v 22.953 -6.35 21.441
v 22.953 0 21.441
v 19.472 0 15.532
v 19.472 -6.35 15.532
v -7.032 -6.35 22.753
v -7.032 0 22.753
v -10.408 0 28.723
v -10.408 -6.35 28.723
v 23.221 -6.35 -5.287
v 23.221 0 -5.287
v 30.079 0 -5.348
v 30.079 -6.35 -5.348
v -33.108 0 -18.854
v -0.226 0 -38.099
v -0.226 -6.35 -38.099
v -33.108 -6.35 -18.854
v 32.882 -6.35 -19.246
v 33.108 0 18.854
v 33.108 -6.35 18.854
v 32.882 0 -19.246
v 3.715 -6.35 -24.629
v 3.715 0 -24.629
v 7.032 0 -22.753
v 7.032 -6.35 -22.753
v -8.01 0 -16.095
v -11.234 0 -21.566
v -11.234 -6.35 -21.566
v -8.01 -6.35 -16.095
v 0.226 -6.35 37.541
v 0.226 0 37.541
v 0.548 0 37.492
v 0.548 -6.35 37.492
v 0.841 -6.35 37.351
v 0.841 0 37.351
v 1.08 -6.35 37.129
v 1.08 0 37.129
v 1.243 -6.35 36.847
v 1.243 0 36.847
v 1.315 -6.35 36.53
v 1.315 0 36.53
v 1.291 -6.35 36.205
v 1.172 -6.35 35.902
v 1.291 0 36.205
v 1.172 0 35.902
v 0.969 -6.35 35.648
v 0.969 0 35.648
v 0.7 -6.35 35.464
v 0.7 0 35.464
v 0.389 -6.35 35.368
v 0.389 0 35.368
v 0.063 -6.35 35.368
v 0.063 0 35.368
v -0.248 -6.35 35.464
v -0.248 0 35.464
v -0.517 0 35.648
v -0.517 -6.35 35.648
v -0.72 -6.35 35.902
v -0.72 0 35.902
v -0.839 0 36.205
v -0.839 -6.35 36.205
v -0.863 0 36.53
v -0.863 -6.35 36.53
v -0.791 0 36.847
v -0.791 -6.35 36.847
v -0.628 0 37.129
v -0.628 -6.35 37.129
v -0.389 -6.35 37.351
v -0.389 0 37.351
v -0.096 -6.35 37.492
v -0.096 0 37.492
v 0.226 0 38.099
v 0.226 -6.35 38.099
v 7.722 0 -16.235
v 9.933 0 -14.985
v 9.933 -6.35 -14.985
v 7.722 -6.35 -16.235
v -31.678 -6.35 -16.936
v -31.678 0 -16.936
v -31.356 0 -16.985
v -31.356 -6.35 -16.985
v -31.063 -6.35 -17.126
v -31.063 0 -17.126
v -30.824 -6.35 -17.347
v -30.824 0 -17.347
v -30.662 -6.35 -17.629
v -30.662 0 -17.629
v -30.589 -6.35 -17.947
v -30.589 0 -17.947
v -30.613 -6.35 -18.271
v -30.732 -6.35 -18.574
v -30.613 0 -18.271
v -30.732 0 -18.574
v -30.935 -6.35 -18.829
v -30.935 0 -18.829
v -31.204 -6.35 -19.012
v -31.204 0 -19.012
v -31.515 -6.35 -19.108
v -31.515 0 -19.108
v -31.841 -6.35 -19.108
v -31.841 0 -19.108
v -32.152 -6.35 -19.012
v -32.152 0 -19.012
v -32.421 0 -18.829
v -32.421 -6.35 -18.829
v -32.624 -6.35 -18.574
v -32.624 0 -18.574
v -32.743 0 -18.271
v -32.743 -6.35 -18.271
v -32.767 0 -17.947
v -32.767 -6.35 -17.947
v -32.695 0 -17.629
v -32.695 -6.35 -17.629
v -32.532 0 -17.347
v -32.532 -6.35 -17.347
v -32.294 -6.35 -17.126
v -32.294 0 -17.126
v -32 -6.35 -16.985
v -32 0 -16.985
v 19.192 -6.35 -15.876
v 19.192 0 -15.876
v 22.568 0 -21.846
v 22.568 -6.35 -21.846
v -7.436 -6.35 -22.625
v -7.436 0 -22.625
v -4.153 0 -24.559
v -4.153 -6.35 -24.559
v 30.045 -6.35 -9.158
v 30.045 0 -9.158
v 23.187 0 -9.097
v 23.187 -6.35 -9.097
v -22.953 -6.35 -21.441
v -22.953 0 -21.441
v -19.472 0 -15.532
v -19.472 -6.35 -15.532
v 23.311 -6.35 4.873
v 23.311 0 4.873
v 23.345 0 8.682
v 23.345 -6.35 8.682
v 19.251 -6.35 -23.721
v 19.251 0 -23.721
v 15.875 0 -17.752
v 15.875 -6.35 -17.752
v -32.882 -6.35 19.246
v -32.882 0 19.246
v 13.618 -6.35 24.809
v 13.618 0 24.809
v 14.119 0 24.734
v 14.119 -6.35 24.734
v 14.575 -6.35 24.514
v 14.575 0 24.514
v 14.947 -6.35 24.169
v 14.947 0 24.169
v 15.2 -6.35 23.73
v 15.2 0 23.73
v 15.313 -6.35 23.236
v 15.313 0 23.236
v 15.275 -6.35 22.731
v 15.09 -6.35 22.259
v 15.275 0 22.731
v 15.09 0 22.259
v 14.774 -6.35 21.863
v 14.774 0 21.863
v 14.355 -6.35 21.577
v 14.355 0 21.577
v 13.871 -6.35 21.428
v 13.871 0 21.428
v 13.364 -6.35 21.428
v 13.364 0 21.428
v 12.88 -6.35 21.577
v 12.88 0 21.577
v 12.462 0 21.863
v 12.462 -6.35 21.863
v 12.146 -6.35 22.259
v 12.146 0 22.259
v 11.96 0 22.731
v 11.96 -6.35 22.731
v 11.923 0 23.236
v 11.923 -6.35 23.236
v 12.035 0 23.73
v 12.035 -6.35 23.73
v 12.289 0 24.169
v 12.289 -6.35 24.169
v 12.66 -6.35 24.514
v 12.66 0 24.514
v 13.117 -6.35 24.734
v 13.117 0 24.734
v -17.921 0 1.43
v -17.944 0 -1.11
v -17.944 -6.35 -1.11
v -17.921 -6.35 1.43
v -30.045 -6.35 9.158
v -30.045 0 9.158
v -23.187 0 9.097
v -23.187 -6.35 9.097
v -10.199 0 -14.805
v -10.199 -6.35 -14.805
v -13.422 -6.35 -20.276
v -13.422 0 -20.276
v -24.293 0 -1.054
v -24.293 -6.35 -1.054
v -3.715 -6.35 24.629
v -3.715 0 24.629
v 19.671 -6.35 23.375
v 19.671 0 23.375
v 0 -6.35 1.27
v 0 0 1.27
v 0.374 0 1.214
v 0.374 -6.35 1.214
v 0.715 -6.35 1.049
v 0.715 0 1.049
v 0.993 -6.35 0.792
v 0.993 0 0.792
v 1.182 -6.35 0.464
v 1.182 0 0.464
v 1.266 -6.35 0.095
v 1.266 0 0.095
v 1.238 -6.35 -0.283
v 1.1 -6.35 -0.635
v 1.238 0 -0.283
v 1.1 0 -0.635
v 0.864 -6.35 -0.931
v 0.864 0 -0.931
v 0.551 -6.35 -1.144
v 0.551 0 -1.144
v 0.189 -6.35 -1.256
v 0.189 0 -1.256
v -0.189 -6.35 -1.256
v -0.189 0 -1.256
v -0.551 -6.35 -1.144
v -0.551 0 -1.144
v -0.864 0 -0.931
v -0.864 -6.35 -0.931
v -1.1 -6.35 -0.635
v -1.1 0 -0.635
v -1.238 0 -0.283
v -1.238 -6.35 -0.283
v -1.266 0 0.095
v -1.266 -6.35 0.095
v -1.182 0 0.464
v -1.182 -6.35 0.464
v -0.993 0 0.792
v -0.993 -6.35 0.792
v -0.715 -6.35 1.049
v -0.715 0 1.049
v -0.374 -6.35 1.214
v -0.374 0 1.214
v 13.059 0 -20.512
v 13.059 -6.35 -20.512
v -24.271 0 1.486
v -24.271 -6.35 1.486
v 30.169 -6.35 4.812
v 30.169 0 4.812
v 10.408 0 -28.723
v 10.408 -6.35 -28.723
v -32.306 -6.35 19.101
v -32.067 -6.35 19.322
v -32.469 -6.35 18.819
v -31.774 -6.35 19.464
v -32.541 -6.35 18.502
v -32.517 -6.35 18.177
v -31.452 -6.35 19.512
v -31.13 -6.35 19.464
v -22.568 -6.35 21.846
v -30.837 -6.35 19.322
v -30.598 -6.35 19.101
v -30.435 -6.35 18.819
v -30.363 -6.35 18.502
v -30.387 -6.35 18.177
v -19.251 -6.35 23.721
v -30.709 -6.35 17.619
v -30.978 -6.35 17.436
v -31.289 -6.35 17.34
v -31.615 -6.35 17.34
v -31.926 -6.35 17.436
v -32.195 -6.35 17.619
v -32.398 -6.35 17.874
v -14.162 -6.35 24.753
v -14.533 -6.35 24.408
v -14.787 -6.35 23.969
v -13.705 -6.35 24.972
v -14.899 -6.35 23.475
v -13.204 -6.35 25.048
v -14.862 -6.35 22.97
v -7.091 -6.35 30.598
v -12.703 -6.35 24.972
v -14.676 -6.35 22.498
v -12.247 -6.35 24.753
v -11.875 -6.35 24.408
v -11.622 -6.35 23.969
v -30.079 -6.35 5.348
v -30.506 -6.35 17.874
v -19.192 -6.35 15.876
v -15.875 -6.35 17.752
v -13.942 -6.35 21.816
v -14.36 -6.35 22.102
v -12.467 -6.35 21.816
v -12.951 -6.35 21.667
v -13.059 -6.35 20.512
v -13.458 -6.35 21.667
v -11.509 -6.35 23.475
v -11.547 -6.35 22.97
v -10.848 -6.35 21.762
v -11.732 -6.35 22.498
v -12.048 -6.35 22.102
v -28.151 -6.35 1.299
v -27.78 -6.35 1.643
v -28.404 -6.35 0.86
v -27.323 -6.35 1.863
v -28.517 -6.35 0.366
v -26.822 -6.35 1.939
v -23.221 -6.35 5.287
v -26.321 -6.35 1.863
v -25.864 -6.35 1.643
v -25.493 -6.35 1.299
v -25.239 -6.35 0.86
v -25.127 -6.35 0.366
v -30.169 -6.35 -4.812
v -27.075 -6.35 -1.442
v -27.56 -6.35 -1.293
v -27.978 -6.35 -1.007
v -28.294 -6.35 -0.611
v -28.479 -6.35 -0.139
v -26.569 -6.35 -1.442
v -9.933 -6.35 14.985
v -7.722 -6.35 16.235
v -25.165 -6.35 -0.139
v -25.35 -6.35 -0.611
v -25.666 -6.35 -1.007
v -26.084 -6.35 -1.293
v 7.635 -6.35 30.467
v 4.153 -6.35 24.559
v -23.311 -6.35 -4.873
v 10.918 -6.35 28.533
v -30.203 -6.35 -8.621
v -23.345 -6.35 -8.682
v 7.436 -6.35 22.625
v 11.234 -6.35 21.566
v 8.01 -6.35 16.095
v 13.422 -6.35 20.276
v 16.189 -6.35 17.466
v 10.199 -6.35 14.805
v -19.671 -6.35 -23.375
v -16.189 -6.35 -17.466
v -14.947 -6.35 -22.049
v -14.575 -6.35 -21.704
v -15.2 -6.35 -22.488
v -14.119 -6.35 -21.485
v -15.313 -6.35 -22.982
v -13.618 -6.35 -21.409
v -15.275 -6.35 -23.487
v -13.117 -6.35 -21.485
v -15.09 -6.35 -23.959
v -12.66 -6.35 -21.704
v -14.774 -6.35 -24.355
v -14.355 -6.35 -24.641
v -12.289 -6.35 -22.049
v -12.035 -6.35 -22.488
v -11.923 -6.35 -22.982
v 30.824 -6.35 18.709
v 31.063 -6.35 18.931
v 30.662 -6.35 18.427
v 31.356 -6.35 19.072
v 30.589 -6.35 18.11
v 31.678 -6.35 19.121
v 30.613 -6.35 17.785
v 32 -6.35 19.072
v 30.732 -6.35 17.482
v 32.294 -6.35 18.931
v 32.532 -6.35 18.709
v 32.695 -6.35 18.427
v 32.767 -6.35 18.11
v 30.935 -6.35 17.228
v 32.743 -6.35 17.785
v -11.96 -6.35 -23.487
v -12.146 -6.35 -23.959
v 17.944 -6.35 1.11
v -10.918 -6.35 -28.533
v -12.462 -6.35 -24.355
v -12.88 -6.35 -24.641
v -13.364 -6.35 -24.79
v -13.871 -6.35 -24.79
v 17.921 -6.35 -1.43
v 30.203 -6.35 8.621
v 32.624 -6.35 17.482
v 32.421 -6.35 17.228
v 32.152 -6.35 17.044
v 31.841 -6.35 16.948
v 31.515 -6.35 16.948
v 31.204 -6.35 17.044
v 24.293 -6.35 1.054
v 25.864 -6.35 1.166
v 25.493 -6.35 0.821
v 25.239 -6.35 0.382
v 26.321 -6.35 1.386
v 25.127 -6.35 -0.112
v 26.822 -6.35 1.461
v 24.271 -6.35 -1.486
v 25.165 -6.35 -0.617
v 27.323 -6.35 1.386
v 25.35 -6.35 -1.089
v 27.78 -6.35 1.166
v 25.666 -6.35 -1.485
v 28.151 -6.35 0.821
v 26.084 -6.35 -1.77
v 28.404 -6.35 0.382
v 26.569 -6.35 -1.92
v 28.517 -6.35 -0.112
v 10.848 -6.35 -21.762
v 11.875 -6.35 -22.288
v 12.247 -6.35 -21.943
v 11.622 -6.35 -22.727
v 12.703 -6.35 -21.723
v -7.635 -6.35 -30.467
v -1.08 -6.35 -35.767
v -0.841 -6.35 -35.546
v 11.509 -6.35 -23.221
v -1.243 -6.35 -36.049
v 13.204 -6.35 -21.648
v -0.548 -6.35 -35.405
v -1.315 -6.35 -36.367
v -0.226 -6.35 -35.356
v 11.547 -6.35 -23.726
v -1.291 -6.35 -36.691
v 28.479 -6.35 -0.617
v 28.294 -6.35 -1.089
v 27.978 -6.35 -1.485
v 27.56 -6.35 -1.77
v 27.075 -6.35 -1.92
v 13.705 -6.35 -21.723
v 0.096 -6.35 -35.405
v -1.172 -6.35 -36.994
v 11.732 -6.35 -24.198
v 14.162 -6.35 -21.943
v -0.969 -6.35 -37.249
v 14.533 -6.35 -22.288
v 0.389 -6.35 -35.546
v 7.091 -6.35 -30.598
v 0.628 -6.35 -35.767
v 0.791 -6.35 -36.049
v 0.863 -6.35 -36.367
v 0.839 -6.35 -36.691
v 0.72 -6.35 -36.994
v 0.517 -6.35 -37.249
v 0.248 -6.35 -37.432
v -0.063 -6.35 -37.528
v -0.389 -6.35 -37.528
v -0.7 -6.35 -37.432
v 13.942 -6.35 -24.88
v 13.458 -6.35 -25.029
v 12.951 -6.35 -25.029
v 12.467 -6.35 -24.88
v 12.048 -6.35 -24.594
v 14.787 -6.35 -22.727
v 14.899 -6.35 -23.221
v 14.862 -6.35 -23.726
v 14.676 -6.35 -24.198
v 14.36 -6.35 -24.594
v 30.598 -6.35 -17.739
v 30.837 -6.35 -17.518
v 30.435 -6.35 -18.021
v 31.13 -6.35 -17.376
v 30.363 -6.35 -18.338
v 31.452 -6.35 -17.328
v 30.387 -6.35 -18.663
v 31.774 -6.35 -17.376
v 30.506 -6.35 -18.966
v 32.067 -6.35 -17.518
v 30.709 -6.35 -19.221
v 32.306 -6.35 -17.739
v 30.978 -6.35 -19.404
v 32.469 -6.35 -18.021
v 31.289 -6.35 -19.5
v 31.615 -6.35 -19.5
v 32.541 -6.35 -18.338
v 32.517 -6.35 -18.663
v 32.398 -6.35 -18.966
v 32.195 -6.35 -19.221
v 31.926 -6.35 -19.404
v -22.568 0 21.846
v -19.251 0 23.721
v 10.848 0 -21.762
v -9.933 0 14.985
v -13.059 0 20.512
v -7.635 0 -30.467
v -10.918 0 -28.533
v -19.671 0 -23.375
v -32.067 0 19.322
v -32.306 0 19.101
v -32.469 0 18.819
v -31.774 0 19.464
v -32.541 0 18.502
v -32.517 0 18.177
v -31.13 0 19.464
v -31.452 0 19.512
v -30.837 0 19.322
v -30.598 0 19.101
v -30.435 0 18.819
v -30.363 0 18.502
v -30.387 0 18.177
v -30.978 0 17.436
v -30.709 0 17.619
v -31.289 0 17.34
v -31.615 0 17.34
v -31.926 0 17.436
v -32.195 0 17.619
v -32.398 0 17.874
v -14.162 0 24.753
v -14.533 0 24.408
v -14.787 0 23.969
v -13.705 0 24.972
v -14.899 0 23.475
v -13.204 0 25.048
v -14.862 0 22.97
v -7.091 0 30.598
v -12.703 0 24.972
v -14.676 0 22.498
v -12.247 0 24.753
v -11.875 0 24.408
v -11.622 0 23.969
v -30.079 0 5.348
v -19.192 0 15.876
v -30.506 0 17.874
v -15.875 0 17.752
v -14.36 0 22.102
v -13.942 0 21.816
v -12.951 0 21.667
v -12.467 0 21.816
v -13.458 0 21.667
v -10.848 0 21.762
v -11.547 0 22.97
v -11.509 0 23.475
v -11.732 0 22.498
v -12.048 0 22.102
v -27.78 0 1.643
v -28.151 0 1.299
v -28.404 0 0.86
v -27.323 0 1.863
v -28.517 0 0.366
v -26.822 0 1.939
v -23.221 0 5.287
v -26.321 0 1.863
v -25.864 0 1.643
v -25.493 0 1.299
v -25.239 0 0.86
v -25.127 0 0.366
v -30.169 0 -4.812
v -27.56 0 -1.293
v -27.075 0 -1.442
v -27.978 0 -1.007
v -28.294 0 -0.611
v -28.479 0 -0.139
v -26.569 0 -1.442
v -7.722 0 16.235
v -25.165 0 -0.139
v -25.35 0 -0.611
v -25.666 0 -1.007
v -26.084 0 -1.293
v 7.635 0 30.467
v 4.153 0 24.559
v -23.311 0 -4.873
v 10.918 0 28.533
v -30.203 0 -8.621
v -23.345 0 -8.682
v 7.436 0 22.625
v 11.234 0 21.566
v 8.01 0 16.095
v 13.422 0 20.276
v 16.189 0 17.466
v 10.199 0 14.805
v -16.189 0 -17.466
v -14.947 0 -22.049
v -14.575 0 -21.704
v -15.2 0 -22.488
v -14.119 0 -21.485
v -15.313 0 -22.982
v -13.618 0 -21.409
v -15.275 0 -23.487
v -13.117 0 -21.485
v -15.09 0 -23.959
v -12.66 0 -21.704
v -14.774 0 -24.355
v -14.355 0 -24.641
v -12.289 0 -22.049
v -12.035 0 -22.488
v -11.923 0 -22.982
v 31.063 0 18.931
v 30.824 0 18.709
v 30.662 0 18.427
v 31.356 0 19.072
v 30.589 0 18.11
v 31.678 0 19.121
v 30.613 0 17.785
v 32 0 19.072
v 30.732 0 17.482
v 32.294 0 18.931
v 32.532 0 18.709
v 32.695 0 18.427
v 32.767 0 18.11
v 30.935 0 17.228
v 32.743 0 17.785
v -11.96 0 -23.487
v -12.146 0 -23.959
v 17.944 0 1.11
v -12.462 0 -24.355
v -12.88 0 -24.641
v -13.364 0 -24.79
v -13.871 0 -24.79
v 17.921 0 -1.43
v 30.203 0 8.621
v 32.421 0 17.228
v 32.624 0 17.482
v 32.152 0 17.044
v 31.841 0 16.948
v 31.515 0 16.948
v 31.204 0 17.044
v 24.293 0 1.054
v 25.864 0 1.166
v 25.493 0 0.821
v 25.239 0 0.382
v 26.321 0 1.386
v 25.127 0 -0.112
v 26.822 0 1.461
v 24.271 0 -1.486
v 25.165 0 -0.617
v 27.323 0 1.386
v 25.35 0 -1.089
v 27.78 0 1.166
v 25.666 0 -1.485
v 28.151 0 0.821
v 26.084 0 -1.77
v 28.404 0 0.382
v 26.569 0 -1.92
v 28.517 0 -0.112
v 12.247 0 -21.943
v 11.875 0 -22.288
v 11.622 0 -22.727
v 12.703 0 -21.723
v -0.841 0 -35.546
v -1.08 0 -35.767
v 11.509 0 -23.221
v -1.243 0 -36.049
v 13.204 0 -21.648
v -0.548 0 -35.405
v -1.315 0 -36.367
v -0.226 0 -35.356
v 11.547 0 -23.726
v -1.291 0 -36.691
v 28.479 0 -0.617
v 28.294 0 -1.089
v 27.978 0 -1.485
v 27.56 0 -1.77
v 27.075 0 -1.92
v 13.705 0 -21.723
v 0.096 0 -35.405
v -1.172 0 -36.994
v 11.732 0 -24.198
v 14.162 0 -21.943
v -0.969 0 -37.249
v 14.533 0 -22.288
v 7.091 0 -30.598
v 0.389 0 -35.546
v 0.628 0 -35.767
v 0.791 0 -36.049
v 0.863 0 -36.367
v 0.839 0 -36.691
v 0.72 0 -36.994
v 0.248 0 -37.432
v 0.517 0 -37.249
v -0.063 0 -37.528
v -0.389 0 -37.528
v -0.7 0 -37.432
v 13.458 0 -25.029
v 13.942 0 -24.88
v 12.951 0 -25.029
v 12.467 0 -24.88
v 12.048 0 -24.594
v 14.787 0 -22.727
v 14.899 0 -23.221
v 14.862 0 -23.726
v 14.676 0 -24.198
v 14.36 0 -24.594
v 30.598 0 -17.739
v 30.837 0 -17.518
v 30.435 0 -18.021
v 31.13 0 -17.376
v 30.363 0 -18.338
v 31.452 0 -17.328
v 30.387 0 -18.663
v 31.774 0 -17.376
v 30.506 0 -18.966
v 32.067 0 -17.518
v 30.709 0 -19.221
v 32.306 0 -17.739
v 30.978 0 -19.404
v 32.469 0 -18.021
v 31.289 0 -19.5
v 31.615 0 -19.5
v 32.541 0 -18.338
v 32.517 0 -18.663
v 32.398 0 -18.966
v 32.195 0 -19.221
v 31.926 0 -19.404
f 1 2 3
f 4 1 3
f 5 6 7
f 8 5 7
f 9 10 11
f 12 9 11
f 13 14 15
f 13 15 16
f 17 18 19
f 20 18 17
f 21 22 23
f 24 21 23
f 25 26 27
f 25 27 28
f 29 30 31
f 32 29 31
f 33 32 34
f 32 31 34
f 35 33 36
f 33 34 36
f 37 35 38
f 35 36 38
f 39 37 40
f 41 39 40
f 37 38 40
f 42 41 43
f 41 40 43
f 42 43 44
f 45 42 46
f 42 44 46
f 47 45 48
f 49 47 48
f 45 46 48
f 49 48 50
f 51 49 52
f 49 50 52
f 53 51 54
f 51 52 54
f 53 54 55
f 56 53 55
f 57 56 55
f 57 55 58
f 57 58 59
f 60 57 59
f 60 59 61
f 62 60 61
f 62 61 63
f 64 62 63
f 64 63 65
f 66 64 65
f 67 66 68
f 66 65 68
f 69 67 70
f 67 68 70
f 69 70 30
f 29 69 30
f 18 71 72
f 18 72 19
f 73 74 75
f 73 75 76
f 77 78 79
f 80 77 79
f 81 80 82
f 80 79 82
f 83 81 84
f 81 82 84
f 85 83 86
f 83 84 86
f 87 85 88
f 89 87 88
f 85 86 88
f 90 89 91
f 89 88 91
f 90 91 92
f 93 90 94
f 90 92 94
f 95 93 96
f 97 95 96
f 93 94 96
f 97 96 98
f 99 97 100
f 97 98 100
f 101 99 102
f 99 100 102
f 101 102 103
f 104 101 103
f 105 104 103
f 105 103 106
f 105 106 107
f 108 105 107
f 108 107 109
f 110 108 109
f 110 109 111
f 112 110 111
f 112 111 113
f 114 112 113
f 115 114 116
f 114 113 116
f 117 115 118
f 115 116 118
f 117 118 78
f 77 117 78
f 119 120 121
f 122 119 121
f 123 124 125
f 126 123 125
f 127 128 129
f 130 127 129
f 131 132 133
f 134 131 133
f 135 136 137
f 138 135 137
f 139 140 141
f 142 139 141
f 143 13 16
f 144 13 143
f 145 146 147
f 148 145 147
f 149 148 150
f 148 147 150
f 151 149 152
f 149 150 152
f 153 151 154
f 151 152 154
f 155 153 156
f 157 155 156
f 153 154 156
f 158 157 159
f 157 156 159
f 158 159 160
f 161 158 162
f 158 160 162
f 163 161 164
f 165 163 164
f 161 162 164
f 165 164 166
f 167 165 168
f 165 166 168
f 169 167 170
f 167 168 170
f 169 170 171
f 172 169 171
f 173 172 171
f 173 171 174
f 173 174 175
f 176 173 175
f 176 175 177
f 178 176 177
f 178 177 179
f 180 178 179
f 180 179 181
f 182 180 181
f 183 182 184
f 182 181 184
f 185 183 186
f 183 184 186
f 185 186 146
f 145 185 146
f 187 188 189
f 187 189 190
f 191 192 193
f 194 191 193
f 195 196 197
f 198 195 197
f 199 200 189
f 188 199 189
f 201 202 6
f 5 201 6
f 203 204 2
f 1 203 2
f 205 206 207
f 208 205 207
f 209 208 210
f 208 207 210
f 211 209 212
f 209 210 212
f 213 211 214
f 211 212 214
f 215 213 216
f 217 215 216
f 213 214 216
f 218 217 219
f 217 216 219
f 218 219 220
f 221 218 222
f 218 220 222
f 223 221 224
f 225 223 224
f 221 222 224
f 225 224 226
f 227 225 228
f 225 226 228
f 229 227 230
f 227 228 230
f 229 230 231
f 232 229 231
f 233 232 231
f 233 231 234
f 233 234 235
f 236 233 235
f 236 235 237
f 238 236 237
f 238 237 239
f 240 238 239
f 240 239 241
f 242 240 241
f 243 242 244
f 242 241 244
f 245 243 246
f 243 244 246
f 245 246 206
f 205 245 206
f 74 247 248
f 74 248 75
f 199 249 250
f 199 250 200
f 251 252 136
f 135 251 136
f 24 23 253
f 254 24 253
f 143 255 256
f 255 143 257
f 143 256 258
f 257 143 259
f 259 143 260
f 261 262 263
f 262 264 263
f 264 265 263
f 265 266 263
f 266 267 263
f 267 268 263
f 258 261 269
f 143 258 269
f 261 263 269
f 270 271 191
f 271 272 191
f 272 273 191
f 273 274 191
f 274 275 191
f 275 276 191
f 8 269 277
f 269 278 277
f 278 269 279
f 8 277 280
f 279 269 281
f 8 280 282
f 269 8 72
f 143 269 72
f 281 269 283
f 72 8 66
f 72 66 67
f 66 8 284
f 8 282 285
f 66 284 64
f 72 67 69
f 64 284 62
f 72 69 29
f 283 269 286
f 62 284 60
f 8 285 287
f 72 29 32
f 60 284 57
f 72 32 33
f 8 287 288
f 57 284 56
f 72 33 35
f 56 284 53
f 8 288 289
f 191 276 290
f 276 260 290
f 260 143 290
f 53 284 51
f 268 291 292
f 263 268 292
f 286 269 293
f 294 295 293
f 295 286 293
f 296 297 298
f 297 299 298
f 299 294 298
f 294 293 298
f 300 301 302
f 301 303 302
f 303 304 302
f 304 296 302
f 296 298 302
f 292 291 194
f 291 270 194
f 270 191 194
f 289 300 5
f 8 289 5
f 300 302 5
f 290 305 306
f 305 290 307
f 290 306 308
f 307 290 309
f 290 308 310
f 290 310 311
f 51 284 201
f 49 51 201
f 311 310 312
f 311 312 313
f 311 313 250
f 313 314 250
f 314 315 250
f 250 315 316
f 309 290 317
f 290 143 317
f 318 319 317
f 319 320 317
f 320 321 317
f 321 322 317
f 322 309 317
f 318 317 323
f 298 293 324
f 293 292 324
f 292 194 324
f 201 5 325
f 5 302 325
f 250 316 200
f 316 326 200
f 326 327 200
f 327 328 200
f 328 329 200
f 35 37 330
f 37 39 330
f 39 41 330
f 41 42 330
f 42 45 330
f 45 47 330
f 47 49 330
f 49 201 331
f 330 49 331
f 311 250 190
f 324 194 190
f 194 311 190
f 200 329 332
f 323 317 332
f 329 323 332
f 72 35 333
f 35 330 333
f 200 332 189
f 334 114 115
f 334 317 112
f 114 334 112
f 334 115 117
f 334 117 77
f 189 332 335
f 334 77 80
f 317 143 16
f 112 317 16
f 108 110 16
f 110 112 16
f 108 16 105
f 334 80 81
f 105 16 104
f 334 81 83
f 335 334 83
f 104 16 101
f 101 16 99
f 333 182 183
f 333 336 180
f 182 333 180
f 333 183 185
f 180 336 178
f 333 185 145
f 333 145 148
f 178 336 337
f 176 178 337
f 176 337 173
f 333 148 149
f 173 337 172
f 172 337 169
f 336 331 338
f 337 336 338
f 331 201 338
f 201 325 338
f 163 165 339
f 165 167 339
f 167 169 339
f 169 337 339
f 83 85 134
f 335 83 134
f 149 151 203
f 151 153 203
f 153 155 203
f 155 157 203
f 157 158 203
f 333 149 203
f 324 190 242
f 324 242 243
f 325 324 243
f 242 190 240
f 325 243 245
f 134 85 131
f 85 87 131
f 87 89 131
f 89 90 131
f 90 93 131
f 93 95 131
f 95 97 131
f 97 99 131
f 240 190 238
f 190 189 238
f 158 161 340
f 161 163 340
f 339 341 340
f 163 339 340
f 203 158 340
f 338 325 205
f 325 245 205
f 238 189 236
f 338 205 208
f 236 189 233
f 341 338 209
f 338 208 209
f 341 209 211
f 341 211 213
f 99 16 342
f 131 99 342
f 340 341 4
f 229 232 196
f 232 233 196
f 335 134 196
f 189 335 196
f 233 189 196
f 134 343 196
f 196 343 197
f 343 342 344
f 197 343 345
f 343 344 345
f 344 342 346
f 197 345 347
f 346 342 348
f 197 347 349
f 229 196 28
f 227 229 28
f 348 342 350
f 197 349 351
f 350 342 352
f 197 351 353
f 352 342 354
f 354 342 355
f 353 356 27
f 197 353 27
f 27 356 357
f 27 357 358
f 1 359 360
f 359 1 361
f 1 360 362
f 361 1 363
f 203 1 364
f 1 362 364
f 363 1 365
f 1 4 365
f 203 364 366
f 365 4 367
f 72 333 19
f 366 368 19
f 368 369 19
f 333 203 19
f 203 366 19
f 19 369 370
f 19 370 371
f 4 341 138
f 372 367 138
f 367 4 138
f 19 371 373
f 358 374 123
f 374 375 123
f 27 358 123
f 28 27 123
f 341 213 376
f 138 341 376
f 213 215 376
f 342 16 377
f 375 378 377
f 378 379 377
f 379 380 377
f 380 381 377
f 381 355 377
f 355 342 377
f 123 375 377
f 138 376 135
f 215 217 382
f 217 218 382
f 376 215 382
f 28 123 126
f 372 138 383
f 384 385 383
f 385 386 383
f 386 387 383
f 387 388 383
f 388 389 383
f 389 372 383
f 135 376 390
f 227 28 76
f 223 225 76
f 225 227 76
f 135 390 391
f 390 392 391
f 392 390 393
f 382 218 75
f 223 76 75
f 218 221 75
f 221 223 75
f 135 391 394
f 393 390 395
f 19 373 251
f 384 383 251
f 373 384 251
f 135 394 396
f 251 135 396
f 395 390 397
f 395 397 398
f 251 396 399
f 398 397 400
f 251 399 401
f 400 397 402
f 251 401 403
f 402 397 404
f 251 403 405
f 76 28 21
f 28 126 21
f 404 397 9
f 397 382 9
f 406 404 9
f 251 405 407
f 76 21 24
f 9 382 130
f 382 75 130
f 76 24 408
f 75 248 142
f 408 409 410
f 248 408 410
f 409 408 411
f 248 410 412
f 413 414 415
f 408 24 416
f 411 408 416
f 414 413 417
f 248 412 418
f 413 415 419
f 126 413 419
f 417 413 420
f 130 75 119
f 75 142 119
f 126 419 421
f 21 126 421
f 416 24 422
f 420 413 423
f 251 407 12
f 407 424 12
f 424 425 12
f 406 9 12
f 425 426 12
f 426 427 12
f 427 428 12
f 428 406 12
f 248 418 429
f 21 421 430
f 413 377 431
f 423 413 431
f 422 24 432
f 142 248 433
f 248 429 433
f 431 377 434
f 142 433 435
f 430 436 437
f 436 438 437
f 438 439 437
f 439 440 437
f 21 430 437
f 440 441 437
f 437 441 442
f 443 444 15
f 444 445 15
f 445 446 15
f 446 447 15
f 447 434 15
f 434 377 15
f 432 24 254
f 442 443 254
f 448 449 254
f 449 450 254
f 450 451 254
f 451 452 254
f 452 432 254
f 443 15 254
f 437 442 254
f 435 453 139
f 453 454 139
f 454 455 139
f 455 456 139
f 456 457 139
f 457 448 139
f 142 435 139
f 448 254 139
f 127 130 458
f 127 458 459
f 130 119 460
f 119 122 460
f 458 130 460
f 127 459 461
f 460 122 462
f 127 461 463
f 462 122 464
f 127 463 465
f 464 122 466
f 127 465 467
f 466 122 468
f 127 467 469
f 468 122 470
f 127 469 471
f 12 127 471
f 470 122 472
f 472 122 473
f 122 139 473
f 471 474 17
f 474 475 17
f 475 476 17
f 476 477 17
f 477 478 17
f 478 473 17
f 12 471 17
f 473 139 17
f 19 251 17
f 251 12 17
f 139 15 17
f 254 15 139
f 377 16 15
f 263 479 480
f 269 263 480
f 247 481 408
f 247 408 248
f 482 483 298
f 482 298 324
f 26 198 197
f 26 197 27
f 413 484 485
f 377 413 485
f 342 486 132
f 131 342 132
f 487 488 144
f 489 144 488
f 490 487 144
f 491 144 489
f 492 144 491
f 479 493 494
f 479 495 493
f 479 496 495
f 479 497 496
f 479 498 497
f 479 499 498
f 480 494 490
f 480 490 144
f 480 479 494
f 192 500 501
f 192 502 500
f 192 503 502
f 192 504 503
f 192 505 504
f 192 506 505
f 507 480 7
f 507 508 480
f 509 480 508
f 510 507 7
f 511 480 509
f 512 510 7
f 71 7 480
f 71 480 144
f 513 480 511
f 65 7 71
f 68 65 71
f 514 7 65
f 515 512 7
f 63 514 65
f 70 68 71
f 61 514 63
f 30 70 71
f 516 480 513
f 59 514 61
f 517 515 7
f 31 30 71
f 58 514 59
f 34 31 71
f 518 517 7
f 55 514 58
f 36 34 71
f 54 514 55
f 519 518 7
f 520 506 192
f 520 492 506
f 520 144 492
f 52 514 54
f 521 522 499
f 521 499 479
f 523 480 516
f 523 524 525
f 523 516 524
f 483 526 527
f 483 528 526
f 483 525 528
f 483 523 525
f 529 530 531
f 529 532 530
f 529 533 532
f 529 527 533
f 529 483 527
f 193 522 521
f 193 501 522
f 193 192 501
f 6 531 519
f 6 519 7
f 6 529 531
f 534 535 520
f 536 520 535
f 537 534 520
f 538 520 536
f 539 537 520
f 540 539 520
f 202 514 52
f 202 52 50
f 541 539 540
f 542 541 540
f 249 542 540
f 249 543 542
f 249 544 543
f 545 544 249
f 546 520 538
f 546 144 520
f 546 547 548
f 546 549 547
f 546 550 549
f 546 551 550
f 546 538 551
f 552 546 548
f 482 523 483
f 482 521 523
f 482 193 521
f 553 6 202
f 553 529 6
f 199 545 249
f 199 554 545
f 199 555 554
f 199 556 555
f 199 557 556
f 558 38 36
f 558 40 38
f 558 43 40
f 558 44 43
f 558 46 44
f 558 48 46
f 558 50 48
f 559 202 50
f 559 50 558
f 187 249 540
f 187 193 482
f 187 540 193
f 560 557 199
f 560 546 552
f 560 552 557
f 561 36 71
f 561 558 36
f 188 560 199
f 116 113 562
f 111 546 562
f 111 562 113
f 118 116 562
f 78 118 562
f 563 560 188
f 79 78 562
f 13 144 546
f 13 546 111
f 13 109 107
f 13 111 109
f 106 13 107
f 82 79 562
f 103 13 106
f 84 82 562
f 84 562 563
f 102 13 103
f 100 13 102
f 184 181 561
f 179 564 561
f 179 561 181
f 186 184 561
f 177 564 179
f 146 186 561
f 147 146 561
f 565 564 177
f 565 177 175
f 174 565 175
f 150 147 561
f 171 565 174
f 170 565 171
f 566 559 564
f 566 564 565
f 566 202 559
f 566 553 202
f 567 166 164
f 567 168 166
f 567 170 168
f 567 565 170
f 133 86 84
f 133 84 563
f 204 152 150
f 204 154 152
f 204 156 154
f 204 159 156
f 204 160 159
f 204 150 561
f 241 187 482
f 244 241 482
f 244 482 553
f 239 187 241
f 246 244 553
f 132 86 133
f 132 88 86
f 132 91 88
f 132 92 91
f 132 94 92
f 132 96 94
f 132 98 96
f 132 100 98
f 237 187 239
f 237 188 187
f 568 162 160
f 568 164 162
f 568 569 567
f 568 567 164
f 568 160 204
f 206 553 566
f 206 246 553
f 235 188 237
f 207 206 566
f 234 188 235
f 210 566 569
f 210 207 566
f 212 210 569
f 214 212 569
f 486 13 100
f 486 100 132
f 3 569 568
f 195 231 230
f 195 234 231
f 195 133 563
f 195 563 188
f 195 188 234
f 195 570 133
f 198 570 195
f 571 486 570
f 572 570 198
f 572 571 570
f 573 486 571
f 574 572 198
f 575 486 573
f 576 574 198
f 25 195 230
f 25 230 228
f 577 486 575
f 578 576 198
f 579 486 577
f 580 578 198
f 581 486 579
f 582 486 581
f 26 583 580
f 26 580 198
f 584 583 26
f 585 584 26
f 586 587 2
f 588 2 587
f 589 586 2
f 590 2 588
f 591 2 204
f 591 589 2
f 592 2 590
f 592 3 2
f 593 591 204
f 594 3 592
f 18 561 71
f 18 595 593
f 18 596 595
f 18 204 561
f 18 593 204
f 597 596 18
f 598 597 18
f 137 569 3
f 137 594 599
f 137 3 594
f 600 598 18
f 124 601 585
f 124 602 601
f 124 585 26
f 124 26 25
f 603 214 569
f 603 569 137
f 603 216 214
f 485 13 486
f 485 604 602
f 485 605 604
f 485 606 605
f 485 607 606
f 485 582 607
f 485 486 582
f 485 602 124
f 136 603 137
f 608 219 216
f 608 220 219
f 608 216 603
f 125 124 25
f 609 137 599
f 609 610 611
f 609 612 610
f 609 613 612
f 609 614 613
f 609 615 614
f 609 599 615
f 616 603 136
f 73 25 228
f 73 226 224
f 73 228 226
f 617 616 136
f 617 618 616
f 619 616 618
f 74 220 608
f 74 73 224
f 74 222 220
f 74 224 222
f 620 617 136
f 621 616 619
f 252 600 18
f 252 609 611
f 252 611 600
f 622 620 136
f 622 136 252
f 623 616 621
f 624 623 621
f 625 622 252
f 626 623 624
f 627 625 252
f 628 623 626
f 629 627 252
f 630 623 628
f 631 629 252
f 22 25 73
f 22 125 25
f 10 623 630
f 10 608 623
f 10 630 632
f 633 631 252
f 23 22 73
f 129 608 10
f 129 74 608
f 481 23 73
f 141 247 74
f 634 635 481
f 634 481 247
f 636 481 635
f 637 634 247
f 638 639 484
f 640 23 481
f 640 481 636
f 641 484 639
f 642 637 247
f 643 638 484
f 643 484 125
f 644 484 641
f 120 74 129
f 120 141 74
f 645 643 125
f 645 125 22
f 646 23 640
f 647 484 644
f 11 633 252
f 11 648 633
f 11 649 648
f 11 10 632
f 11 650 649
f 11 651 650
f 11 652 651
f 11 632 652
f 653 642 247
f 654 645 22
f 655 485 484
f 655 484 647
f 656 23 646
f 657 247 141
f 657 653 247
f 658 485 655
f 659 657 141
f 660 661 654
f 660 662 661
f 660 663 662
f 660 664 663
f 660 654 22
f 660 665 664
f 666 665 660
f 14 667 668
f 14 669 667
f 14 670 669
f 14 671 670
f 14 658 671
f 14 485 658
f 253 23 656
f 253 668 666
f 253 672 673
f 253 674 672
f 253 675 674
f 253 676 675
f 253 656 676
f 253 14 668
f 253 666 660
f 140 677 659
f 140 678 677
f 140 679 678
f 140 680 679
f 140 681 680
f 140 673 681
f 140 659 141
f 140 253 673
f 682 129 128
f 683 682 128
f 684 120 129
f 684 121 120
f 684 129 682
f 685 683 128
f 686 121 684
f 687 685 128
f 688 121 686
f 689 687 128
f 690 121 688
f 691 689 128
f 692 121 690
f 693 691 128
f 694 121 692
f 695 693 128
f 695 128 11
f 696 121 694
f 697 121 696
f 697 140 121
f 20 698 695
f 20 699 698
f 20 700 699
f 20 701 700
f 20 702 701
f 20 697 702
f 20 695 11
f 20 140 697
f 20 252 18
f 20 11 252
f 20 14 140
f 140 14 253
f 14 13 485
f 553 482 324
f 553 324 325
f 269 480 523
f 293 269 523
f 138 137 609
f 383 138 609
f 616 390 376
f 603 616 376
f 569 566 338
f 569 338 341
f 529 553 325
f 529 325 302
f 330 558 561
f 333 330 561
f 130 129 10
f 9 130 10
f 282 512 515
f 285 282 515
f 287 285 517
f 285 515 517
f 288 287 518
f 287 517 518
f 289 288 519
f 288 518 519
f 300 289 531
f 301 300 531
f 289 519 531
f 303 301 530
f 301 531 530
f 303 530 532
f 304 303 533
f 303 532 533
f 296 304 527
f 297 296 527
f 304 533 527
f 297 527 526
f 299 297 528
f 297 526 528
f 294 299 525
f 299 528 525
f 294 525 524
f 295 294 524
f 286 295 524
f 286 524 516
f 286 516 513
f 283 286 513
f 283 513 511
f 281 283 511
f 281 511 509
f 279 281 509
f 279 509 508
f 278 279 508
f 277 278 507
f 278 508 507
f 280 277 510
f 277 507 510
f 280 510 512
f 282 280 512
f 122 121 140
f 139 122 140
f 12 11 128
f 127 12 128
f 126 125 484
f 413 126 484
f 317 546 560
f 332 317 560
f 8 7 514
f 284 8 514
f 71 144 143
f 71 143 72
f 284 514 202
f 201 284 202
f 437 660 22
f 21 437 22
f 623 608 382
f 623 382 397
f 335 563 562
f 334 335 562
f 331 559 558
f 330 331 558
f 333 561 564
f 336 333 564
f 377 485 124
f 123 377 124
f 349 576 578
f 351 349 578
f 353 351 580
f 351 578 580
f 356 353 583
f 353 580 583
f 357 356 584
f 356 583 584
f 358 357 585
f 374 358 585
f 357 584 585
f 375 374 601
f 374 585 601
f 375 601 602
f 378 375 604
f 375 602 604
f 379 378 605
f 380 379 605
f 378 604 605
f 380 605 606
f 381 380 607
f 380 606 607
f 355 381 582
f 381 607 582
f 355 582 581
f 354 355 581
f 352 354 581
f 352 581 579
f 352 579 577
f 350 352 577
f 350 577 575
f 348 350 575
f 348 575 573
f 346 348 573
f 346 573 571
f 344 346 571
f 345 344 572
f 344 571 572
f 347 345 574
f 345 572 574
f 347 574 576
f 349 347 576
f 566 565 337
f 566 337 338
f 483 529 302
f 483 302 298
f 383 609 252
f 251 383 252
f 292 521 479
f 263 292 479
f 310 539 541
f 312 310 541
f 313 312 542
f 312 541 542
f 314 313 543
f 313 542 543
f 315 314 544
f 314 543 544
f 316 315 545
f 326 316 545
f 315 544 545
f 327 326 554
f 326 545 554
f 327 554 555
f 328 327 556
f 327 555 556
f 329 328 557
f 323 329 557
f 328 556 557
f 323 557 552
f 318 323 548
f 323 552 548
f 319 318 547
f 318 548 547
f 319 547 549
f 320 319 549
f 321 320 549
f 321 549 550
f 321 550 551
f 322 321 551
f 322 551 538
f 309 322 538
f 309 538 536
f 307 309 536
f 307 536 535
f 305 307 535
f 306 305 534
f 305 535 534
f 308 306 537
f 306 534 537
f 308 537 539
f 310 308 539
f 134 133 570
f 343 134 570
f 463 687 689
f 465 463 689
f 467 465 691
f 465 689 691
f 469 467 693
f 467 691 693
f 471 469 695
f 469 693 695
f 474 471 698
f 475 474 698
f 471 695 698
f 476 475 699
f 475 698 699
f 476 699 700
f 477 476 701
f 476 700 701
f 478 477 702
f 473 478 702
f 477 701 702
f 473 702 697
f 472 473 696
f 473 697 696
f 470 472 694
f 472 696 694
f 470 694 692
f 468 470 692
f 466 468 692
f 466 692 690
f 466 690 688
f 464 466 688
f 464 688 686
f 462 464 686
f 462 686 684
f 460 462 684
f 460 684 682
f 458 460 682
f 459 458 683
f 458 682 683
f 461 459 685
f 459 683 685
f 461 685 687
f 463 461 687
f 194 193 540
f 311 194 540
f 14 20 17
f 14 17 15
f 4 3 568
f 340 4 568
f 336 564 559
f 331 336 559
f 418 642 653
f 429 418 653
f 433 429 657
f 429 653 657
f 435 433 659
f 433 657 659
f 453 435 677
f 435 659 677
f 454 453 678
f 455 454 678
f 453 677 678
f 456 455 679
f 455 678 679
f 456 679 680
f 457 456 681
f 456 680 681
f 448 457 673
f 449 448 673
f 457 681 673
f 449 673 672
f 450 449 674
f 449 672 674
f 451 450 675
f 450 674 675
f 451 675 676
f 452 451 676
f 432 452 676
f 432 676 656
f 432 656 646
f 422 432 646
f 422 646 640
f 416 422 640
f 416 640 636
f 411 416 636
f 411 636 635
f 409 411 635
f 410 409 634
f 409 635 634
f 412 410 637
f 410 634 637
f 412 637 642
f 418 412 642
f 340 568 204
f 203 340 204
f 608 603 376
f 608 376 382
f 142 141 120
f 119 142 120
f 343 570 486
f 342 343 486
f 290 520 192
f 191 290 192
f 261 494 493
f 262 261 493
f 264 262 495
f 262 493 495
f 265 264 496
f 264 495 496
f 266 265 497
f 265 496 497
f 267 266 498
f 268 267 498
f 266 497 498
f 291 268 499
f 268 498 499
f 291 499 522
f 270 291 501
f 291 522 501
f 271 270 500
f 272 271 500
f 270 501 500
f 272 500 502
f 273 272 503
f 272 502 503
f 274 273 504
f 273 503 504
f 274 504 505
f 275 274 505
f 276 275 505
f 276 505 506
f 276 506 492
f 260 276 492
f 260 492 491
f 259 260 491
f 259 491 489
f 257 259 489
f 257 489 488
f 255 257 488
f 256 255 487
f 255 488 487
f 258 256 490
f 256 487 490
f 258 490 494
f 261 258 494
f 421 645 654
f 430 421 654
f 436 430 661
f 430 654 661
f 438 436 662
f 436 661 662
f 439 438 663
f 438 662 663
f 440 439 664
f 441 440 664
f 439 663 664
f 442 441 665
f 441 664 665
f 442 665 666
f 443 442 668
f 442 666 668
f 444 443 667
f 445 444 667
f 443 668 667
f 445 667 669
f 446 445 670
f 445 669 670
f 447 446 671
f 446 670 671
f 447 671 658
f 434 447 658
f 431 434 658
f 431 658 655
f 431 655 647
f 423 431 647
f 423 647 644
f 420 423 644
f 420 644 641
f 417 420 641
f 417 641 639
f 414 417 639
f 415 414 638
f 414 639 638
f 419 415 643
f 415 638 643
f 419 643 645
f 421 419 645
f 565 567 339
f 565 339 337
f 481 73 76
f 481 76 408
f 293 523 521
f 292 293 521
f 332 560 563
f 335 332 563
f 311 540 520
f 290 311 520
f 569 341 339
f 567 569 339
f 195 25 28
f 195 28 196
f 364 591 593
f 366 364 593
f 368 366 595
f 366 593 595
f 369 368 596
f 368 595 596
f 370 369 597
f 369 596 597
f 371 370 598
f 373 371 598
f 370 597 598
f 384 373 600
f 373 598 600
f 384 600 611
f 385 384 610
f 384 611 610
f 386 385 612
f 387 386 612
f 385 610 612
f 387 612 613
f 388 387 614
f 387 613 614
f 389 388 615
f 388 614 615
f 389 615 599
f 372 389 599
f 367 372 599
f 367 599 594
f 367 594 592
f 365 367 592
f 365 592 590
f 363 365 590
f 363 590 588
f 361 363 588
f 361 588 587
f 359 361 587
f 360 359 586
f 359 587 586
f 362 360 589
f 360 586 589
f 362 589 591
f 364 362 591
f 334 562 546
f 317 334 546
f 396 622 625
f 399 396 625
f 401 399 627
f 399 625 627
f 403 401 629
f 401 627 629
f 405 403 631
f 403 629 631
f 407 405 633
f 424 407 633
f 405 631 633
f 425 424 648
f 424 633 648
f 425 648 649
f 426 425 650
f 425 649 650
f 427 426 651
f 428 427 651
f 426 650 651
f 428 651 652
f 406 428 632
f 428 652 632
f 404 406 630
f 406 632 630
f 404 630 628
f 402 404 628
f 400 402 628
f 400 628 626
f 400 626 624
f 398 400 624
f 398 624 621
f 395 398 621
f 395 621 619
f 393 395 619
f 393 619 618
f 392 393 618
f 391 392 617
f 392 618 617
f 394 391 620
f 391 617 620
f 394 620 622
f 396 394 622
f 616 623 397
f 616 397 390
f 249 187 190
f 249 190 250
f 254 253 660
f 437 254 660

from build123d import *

# Parameters (mm, degrees)
SKETCH1_R           = 1.7
SKETCH1_R_2         = 1.0922
SKETCH1_R_3         = 1.27
BOSS_EXTRUDE1_DEPTH = 6.35


with BuildPart() as part:
    # Sketch1 → Boss-Extrude1 (new body)
    with BuildSketch(Plane(origin=(0, 0, 0), x_dir=(1, 0, 0), z_dir=(0, 1, 0))):
        Polygon((33.108066621, -18.853803983), (32.881906518, 19.245524772), (-0.226160103, 38.099328755), (-33.108066621, 18.853803983), (-32.881906518, -19.245524772), (0.226160103, -38.099328755), align=None)
        Polygon((17.921026369, 1.429624434), (24.27077465, 1.48616446), (24.29339066, -1.053734852), (17.94364238, -1.110274878), align=None, mode=Mode.SUBTRACT)
        Polygon((10.198604263, -14.805251881), (13.422443502, -20.276025186), (11.234134179, -21.565560882), (8.01029494, -16.094787576), align=None, mode=Mode.SUBTRACT)
        Polygon((-7.722422107, -16.234876315), (-10.848331148, -21.762189646), (-13.059256481, -20.51182603), (-9.933347439, -14.984512698), align=None, mode=Mode.SUBTRACT)
        Polygon((-17.921026369, -1.429624434), (-24.27077465, -1.48616446), (-24.29339066, 1.053734852), (-17.94364238, 1.110274878), align=None, mode=Mode.SUBTRACT)
        Polygon((-10.198604263, 14.805251881), (-13.422443502, 20.276025186), (-11.234134179, 21.565560882), (-8.01029494, 16.094787576), align=None, mode=Mode.SUBTRACT)
        Polygon((7.722422107, 16.234876315), (10.848331148, 21.762189646), (13.059256481, 20.51182603), (9.933347439, 14.984512698), align=None, mode=Mode.SUBTRACT)
        Polygon((-19.191887032, -15.876365047), (-15.875499033, -17.751910472), (-19.251480798, -23.72140887), (-22.567868797, -21.845863445), align=None, mode=Mode.SUBTRACT)
        with Locations((-13.204157431, -23.347933171)):
            Circle(SKETCH1_R, mode=Mode.SUBTRACT)
        Polygon((-7.031797703, -22.753364938), (-3.715409704, -24.628910363), (-7.091391469, -30.598408761), (-10.407779468, -28.722863336), align=None, mode=Mode.SUBTRACT)
        with Locations((-31.452098576, -18.420024772)):
            Circle(SKETCH1_R_2, mode=Mode.SUBTRACT)
        Polygon((-23.22089091, -5.286967024), (-23.186966894, -9.096815993), (-30.044695037, -9.15787922), (-30.078619053, -5.348030252), align=None, mode=Mode.SUBTRACT)
        with Locations((-26.821981967, -0.238830814)):
            Circle(SKETCH1_R, mode=Mode.SUBTRACT)
        with Locations((0.226160103, -36.448328755)):
            Circle(SKETCH1_R_2, mode=Mode.SUBTRACT)
        Polygon((4.153391934, -24.55884424), (7.435855918, -22.624540696), (10.917602296, -28.532975866), (7.635138312, -30.46727941), align=None, mode=Mode.SUBTRACT)
        with Locations((13.617824536, -23.109102356)):
            Circle(SKETCH1_R, mode=Mode.SUBTRACT)
        Polygon((16.189093207, -17.466397914), (19.47155719, -15.532094371), (22.953303568, -21.440529541), (19.670839585, -23.374833084), align=None, mode=Mode.SUBTRACT)
        with Locations((31.678258679, -18.028303983)):
            Circle(SKETCH1_R_2, mode=Mode.SUBTRACT)
        Polygon((23.345278966, -8.682479193), (23.311354951, -4.872630224), (30.169083094, -4.811566997), (30.203007109, -8.621415965), align=None, mode=Mode.SUBTRACT)
        Polygon((-23.345278966, 8.682479193), (-23.311354951, 4.872630224), (-30.169083094, 4.811566997), (-30.203007109, 8.621415965), align=None, mode=Mode.SUBTRACT)
        with Locations((-31.678258679, 18.028303983)):
            Circle(SKETCH1_R_2, mode=Mode.SUBTRACT)
        Polygon((30.044695037, 9.15787922), (30.078619053, 5.348030252), (23.22089091, 5.286967024), (23.186966894, 9.096815993), align=None, mode=Mode.SUBTRACT)
        with Locations((31.452098576, 18.420024772)):
            Circle(SKETCH1_R_2, mode=Mode.SUBTRACT)
        Polygon((7.031797703, 22.753364938), (3.715409704, 24.628910363), (7.091391469, 30.598408761), (10.407779468, 28.722863336), align=None, mode=Mode.SUBTRACT)
        with Locations((13.204157431, 23.347933171)):
            Circle(SKETCH1_R, mode=Mode.SUBTRACT)
        Polygon((19.191887032, 15.876365047), (15.875499033, 17.751910472), (19.251480798, 23.72140887), (22.567868797, 21.845863445), align=None, mode=Mode.SUBTRACT)
        Polygon((-16.189093207, 17.466397914), (-19.47155719, 15.532094371), (-22.953303568, 21.440529541), (-19.670839585, 23.374833084), align=None, mode=Mode.SUBTRACT)
        with Locations((-13.617824536, 23.109102356)):
            Circle(SKETCH1_R, mode=Mode.SUBTRACT)
        Polygon((-7.435855918, 22.624540696), (-10.917602296, 28.532975866), (-7.635138312, 30.46727941), (-4.153391934, 24.55884424), align=None, mode=Mode.SUBTRACT)
        with Locations((-0.226160103, 36.448328755)):
            Circle(SKETCH1_R_2, mode=Mode.SUBTRACT)
        with Locations((26.821981967, 0.238830814)):
            Circle(SKETCH1_R, mode=Mode.SUBTRACT)
        Circle(SKETCH1_R_3, mode=Mode.SUBTRACT)
    extrude(amount=-BOSS_EXTRUDE1_DEPTH)


solid = part.part
